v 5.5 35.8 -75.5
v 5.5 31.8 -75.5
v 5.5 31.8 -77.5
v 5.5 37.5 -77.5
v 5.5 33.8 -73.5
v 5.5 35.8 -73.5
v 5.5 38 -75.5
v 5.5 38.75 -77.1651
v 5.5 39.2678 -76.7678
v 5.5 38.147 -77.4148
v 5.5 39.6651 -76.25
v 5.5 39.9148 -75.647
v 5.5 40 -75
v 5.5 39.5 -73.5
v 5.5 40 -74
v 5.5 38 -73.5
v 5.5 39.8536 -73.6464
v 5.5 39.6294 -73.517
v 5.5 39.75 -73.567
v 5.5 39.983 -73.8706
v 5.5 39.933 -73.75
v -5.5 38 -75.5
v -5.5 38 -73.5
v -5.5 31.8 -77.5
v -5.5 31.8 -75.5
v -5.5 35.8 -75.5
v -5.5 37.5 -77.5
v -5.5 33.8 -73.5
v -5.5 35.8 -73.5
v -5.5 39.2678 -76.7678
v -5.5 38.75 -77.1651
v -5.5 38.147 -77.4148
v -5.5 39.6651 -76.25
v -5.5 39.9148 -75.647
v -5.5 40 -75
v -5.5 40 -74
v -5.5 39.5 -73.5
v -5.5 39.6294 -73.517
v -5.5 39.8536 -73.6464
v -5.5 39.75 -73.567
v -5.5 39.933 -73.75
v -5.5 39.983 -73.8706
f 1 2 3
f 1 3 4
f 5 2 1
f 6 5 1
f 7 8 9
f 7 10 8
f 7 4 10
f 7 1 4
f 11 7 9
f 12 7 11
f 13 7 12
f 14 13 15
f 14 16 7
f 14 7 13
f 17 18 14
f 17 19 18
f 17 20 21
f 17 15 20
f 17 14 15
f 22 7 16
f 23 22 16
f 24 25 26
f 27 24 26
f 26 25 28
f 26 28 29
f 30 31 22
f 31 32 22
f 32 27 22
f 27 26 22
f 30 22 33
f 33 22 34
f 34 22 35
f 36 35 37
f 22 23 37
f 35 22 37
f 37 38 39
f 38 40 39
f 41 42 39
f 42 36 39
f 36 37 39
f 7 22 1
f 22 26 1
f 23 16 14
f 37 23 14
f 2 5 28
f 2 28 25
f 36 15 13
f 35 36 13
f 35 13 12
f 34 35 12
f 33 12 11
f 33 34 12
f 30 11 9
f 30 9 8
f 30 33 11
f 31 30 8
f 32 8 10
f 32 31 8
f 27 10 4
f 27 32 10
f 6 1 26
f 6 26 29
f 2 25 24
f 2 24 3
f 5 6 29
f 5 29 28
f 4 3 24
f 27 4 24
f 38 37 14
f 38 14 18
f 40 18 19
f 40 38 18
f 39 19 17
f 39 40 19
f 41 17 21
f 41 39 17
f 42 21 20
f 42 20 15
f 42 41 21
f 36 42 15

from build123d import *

# Parameters (mm, degrees)
SKETCH1_W                       = 39
SKETCH1_H                       = 155
BOSS_EXTRUDE1_DEPTH             = 2
BOSS_EXTRUDE2_DEPTH             = 38
SKETCH3_W                       = 2
SKETCH3_H                       = 2
BOSS_EXTRUDE3_DEPTH             = 38
SKETCH4_W                       = 2
SKETCH4_H                       = 2
BOSS_EXTRUDE4_DEPTH             = 151
SKETCH6_W                       = 35
SKETCH6_H                       = 2.2
CUT_EXTRUDE1_DEPTH              = 160.340045186
SKETCH7_W                       = 35
SKETCH7_H                       = 2.2
CUT_EXTRUDE2_DEPTH              = 89.490112442
SKETCH5_W                       = 31
SKETCH5_H                       = 2
BOSS_EXTRUDE5_DEPTH             = 2
BOSS_EXTRUDE6_REACH             = 91.367
SKETCH8_W                       = 2
SKETCH8_H                       = 2
BOSS_EXTRUDE6_DIRECTION_2_REACH = 91.367
SKETCH10_W                      = 2
SKETCH10_H                      = 2.2
SKETCH10_W_2                    = 2.2
SKETCH10_H_2                    = 2
BOSS_EXTRUDE8_DEPTH             = 2
SKETCH11_W                      = 2
SKETCH11_H                      = 2.2
SKETCH11_W_2                    = 2.2
SKETCH11_H_2                    = 2
BOSS_EXTRUDE9_DEPTH             = 2
FILLET2_R                       = 2.5
SKETCH14_W                      = 36.5
SKETCH14_H                      = 7.75
BOSS_EXTRUDE10_DEPTH            = 2
SKETCH13_W                      = 31
SKETCH13_H                      = 3
CUT_EXTRUDE4_DEPTH              = 2
FILLET3_R                       = 2
FILLET4_R                       = 0.5
SKETCH15_R                      = 5.1
CUT_EXTRUDE5_DEPTH              = 90.367219941
SKETCH16_R                      = 7.1
BOSS_EXTRUDE11_DEPTH            = 1
FILLET5_R                       = 0.5
FILLET7_R                       = 0.5
CUT_EXTRUDE6_DEPTH              = 6
SKETCH18_W                      = 29
SKETCH18_H                      = 3
CUT_EXTRUDE8_DEPTH              = 90.367219986
CUT_EXTRUDE11_DEPTH             = 90.367219986
CUT_EXTRUDE11_DEPTH_BACK        = 90.367219986
SKETCH20_W                      = 5
SKETCH20_H                      = 40
SKETCH21_W                      = 9
SKETCH21_H                      = 31
CUT_EXTRUDE12_DEPTH             = 89.41097217
SKETCH22_W                      = 11
SKETCH22_H                      = 22.8
CUT_EXTRUDE13_DEPTH             = 41.425858061


with BuildPart() as part:
    # Sketch1 → Boss-Extrude1 (new body)
    with BuildSketch(Plane(origin=(0, 0, 0), x_dir=(1, 0, 0), z_dir=(0, 1, 0))):
        Rectangle(SKETCH1_W, SKETCH1_H)
    extrude(amount=BOSS_EXTRUDE1_DEPTH)

    # Sketch2 → Boss-Extrude2 (add)
    with BuildSketch(Plane(origin=(0, 2, 0), x_dir=(1, 0, 0), z_dir=(0, 1, 0))):
        Polygon((-17.5, -77.5), (-17.5, -75.5), (-17.5, 75.5), (17.5, 75.5), (17.5, -75.5), (17.5, -77.5), (19.5, -77.5), (19.5, 77.5), (-19.5, 77.5), (-19.5, -77.5), align=None)
    extrude(amount=BOSS_EXTRUDE2_DEPTH)

    # Sketch3 → Boss-Extrude3 (add)
    with BuildSketch(Plane(origin=(0, 2, 0), x_dir=(1, 0, 0), z_dir=(0, 1, 0))):
        with Locations((-16.5, -76.5)):
            Rectangle(SKETCH3_W, SKETCH3_H)
        with Locations((-16.5, -72.3)):
            Rectangle(SKETCH3_W, SKETCH3_H)
        with Locations((16.5, -76.5)):
            Rectangle(SKETCH3_W, SKETCH3_H)
        with Locations((16.5, -72.3)):
            Rectangle(SKETCH3_W, SKETCH3_H)
    extrude(amount=BOSS_EXTRUDE3_DEPTH)

    # Sketch4 → Boss-Extrude4 (add)
    with BuildSketch(Plane.XY.offset(-75.5)):
        with Locations((-16.5, 39)):
            Rectangle(SKETCH4_W, SKETCH4_H)
        Polygon((-15.5, 33.8), (-17.5, 31.8), (-17.5, 35.8), (-15.5, 35.8), align=None)
        Polygon((15.5, 35.8), (17.5, 35.8), (17.5, 31.8), (15.5, 33.8), align=None)
        with Locations((16.5, 39)):
            Rectangle(SKETCH4_W, SKETCH4_H)
    extrude(amount=BOSS_EXTRUDE4_DEPTH)

    # Sketch6 → Cut-Extrude1 (cut, through all)
    with BuildSketch(Plane.XY.offset(-75.5)):
        with Locations((0, 36.9)):
            Rectangle(SKETCH6_W, SKETCH6_H)
    extrude(amount=CUT_EXTRUDE1_DEPTH, mode=Mode.SUBTRACT)

    # Sketch7 → Cut-Extrude2 (cut, through all)
    with BuildSketch(Plane(origin=(0, 2, 0), x_dir=(1, 0, 0), z_dir=(0, 1, 0))):
        with Locations((0, -74.4)):
            Rectangle(SKETCH7_W, SKETCH7_H)
    extrude(amount=CUT_EXTRUDE2_DEPTH, mode=Mode.SUBTRACT)

    # Sketch5 → Boss-Extrude5 (add)
    with BuildSketch(Plane(origin=(0, 2, 0), x_dir=(1, 0, 0), z_dir=(0, 1, 0))):
        with Locations((0, -76.5)):
            Rectangle(SKETCH5_W, SKETCH5_H)
        with Locations((0, -72.3)):
            Rectangle(SKETCH5_W, SKETCH5_H)
    extrude(amount=BOSS_EXTRUDE5_DEPTH)

    # Boss-Extrude6: up to this face of the body (flat: up to its plane)
    boss_extrude6_end = Plane(part.part.faces().sort_by_distance((17.5, 16.9, -2.1))[0])
    # Sketch8 → Boss-Extrude6 (add, up to the picked face)
    with BuildSketch(Plane(origin=(0, 0, 0), x_dir=(0, 0, -1), z_dir=(1, 0, 0)), mode=Mode.PRIVATE) as boss_extrude6_sk1:
        with Locations((74.5, 39)):
            Rectangle(SKETCH8_W, SKETCH8_H)
    boss_extrude6_tool1 = split(extrude(boss_extrude6_sk1.sketch, amount=BOSS_EXTRUDE6_REACH, mode=Mode.PRIVATE), bisect_by=boss_extrude6_end, keep=Keep.BOTH, mode=Mode.PRIVATE)
    # Sketch8 → Boss-Extrude6 (add, up to the picked face)
    with BuildSketch(Plane(origin=(0, 0, 0), x_dir=(0, 0, -1), z_dir=(1, 0, 0)), mode=Mode.PRIVATE) as boss_extrude6_sk2:
        Polygon((75.5, 35.8), (73.5, 35.8), (73.5, 33.8), (75.5, 31.8), align=None)
    boss_extrude6_tool2 = split(extrude(boss_extrude6_sk2.sketch, amount=BOSS_EXTRUDE6_REACH, mode=Mode.PRIVATE), bisect_by=boss_extrude6_end, keep=Keep.BOTH, mode=Mode.PRIVATE)
    add(boss_extrude6_tool1.solids().sort_by(Axis((0, 39, -74.5), (1, 0, 0)))[0])
    add(boss_extrude6_tool2.solids().sort_by(Axis((0, 34.244444, -74.611111), (1, 0, 0)))[0])

    # Boss-Extrude6 direction 2: up to this face of the body (flat: up to its plane)
    boss_extrude6_direction_2_end = Plane(part.part.faces().sort_by_distance((-17.5, 16.9, -2.1))[0])
    # Sketch8 → Boss-Extrude6 direction 2 (add, up to the picked face)
    with BuildSketch(Plane(origin=(0, 0, 0), x_dir=(0, 0, -1), z_dir=(1, 0, 0)), mode=Mode.PRIVATE) as boss_extrude6_direction_2_sk1:
        with Locations((74.5, 39)):
            Rectangle(SKETCH8_W, SKETCH8_H)
    boss_extrude6_direction_2_tool1 = split(extrude(boss_extrude6_direction_2_sk1.sketch, amount=-BOSS_EXTRUDE6_DIRECTION_2_REACH, mode=Mode.PRIVATE), bisect_by=boss_extrude6_direction_2_end, keep=Keep.BOTH, mode=Mode.PRIVATE)
    # Sketch8 → Boss-Extrude6 direction 2 (add, up to the picked face)
    with BuildSketch(Plane(origin=(0, 0, 0), x_dir=(0, 0, -1), z_dir=(1, 0, 0)), mode=Mode.PRIVATE) as boss_extrude6_direction_2_sk2:
        Polygon((75.5, 35.8), (73.5, 35.8), (73.5, 33.8), (75.5, 31.8), align=None)
    boss_extrude6_direction_2_tool2 = split(extrude(boss_extrude6_direction_2_sk2.sketch, amount=-BOSS_EXTRUDE6_DIRECTION_2_REACH, mode=Mode.PRIVATE), bisect_by=boss_extrude6_direction_2_end, keep=Keep.BOTH, mode=Mode.PRIVATE)
    add(boss_extrude6_direction_2_tool1.solids().sort_by(Axis((0, 39, -74.5), (-1, 0, 0)))[0])
    add(boss_extrude6_direction_2_tool2.solids().sort_by(Axis((0, 34.244444, -74.611111), (-1, 0, 0)))[0])

    # Sketch10 → Boss-Extrude8 (add)
    with BuildSketch(Plane(origin=(-17.5, 0, 0), x_dir=(0, 0, -1), z_dir=(1, 0, 0))):
        with Locations((-76.5, 36.9)):
            Rectangle(SKETCH10_W, SKETCH10_H)
        with Locations((-74.4, 39)):
            Rectangle(SKETCH10_W_2, SKETCH10_H_2)
    extrude(amount=BOSS_EXTRUDE8_DEPTH)

    # Sketch11 → Boss-Extrude9 (add)
    with BuildSketch(Plane.ZY.offset(-17.5)):
        with Locations((76.5, 36.9)):
            Rectangle(SKETCH11_W, SKETCH11_H)
        with Locations((74.4, 39)):
            Rectangle(SKETCH11_W_2, SKETCH11_H_2)
    extrude(amount=BOSS_EXTRUDE9_DEPTH)

    # Fillet2
    fillet2_edges = [part.edges().sort_by_distance(p)[0] for p in [
        (-17.5, 16.9, 71.3),
        (17.5, 16.9, 71.3),
        (19.5, 20, 77.5),
        (-19.5, 20, 77.5),
        (-19.5, 20, -77.5),
        (-17.5, 16.9, -75.5),
        (17.5, 16.9, -75.5),
        (19.5, 20, -77.5),
        (19.5, 40, 0),
        (-19.5, 40, 0),
        (19.5, 0, 0),
        (-19.5, 0, 0),
        (0, 40, -77.5),
        (0, 0, 77.5),
        (0, 0, -77.5),
        (-17.5, 40, 77.5),
        (17.5, 40, 77.5),
    ]]
    fillet(fillet2_edges, radius=FILLET2_R)

    # Sketch14 → Boss-Extrude10 (add)
    with BuildSketch(Plane.XY.offset(-75.5)):
        with Locations((0, 5.125)):
            Rectangle(SKETCH14_W, SKETCH14_H)
    extrude(amount=BOSS_EXTRUDE10_DEPTH)

    # Sketch13 → Cut-Extrude4 (cut)
    with BuildSketch(Plane(origin=(0, 0, -77.5), x_dir=(-1, 0, 0), z_dir=(0, 0, -1))):
        with Locations((0, 5.5)):
            Rectangle(SKETCH13_W, SKETCH13_H)
    extrude(amount=-CUT_EXTRUDE4_DEPTH, mode=Mode.SUBTRACT)

    # Fillet3
    fillet3_edges = [part.edges().sort_by_distance(p)[0] for p in [
        (0, 9, -73.5),
    ]]
    fillet(fillet3_edges, radius=FILLET3_R - 0.0001)  # a hair under: the kernel refuses the full size

    # Fillet4
    fillet4_edges = [part.edges().sort_by_distance(p)[0] for p in [
        (15.5, 5.5, -75.5),
        (15.5, 4, -76.5),
        (0, 7, -75.5),
        (15.5, 7, -76.5),
        (-15.5, 5.5, -75.5),
        (-15.5, 7, -76.5),
        (0, 4, -75.5),
        (-15.5, 4, -76.5),
        (15.5, 5.5, -77.5),
        (0, 4, -77.5),
        (-15.5, 5.5, -77.5),
        (0, 7, -77.5),
    ]]
    fillet(fillet4_edges, radius=FILLET4_R)

    # Sketch15 → Cut-Extrude5 (cut, through all)
    with BuildSketch(Plane.XZ):
        with Locations(Location((0, 38.75, 0), (0, 0, 270))):
            Circle(SKETCH15_R)
        with Locations(Location((0, -38.75, 0), (0, 0, 270))):
            Circle(SKETCH15_R)
    extrude(amount=-CUT_EXTRUDE5_DEPTH, mode=Mode.SUBTRACT)

    # Sketch16 → Boss-Extrude11 (add)
    with BuildSketch(Plane(origin=(0, 2, 0), x_dir=(1, 0, 0), z_dir=(0, 1, 0))):
        with Locations(Location((0, 38.75, 0), (0, 0, 270))):
            Circle(SKETCH16_R)
        with Locations(Location((0, -38.75, 0), (0, 0, 270))):
            Circle(SKETCH16_R)
    extrude(amount=BOSS_EXTRUDE11_DEPTH)

    # Fillet5
    fillet5_edges = [part.edges().sort_by_distance(p)[0] for p in [
        (0, 2, -45.85),
        (0, 3, -45.85),
        (0, 2, 31.65),
        (0, 3, 31.65),
    ]]
    fillet(fillet5_edges, radius=FILLET5_R - 0.0001)  # a hair under: the kernel refuses the full size

    # Fillet7
    fillet7_edges = [part.edges().sort_by_distance(p)[0] for p in [
        (15.5, 40, 0.75),
        (0, 4, 77.5),
        (0, 40, -73.5),
        (-15.5, 40, 0.75),
        (-15.5, 20.75, 77.5),
        (-15.5, 39.267766953, 76.767766953),
        (15.5, 20.75, 77.5),
        (15.5, 39.267766953, 76.767766953),
    ]]
    fillet(fillet7_edges, radius=FILLET7_R)

    # Sketch17 → Cut-Extrude6 (cut)
    with BuildSketch(Plane.XZ):
        Polygon((-17, -77.5), (-17, 70.299999999), (-14.999999999, 71.3), (-14.999999999, 77.5), (14.999999999, 77.5), (14.999999999, 71.3), (17, 70.299999999), (17, -77.5), align=None)
    extrude(amount=-CUT_EXTRUDE6_DEPTH, mode=Mode.SUBTRACT)

    # Sketch18 → Cut-Extrude8 (cut, through all)
    with BuildSketch(Plane.XY):
        with Locations((0, 7.5)):
            Rectangle(SKETCH18_W, SKETCH18_H)
    extrude(amount=-CUT_EXTRUDE8_DEPTH, mode=Mode.SUBTRACT)

    # Sketch20 → Cut-Extrude11 (cut, two sides: drawn at the far end of the back side and taken through both)
    with BuildSketch(Plane.XY.offset(-CUT_EXTRUDE11_DEPTH_BACK)):
        Polygon((19.5, 40), (14.5, 40), (14.5, 6), (14.5, 0), (19.5, 0), align=None)
        with Locations((-17, 20)):
            Rectangle(SKETCH20_W, SKETCH20_H)
    extrude(amount=CUT_EXTRUDE11_DEPTH + CUT_EXTRUDE11_DEPTH_BACK, mode=Mode.SUBTRACT)

    # Sketch21 → Cut-Extrude12 (cut, through all)
    with BuildSketch(Plane.XY):
        with Locations((-10, 24.5)):
            Rectangle(SKETCH21_W, SKETCH21_H)
        with Locations((10, 24.5)):
            Rectangle(SKETCH21_W, SKETCH21_H)
    extrude(amount=-CUT_EXTRUDE12_DEPTH, mode=Mode.SUBTRACT)

    # Sketch22 → Cut-Extrude13 (cut, through all)
    with BuildSketch(Plane.XY.offset(-75.5)):
        with Locations((0, 20.4)):
            Rectangle(SKETCH22_W, SKETCH22_H)
    extrude(amount=-CUT_EXTRUDE13_DEPTH, mode=Mode.SUBTRACT)


solid = part.part
